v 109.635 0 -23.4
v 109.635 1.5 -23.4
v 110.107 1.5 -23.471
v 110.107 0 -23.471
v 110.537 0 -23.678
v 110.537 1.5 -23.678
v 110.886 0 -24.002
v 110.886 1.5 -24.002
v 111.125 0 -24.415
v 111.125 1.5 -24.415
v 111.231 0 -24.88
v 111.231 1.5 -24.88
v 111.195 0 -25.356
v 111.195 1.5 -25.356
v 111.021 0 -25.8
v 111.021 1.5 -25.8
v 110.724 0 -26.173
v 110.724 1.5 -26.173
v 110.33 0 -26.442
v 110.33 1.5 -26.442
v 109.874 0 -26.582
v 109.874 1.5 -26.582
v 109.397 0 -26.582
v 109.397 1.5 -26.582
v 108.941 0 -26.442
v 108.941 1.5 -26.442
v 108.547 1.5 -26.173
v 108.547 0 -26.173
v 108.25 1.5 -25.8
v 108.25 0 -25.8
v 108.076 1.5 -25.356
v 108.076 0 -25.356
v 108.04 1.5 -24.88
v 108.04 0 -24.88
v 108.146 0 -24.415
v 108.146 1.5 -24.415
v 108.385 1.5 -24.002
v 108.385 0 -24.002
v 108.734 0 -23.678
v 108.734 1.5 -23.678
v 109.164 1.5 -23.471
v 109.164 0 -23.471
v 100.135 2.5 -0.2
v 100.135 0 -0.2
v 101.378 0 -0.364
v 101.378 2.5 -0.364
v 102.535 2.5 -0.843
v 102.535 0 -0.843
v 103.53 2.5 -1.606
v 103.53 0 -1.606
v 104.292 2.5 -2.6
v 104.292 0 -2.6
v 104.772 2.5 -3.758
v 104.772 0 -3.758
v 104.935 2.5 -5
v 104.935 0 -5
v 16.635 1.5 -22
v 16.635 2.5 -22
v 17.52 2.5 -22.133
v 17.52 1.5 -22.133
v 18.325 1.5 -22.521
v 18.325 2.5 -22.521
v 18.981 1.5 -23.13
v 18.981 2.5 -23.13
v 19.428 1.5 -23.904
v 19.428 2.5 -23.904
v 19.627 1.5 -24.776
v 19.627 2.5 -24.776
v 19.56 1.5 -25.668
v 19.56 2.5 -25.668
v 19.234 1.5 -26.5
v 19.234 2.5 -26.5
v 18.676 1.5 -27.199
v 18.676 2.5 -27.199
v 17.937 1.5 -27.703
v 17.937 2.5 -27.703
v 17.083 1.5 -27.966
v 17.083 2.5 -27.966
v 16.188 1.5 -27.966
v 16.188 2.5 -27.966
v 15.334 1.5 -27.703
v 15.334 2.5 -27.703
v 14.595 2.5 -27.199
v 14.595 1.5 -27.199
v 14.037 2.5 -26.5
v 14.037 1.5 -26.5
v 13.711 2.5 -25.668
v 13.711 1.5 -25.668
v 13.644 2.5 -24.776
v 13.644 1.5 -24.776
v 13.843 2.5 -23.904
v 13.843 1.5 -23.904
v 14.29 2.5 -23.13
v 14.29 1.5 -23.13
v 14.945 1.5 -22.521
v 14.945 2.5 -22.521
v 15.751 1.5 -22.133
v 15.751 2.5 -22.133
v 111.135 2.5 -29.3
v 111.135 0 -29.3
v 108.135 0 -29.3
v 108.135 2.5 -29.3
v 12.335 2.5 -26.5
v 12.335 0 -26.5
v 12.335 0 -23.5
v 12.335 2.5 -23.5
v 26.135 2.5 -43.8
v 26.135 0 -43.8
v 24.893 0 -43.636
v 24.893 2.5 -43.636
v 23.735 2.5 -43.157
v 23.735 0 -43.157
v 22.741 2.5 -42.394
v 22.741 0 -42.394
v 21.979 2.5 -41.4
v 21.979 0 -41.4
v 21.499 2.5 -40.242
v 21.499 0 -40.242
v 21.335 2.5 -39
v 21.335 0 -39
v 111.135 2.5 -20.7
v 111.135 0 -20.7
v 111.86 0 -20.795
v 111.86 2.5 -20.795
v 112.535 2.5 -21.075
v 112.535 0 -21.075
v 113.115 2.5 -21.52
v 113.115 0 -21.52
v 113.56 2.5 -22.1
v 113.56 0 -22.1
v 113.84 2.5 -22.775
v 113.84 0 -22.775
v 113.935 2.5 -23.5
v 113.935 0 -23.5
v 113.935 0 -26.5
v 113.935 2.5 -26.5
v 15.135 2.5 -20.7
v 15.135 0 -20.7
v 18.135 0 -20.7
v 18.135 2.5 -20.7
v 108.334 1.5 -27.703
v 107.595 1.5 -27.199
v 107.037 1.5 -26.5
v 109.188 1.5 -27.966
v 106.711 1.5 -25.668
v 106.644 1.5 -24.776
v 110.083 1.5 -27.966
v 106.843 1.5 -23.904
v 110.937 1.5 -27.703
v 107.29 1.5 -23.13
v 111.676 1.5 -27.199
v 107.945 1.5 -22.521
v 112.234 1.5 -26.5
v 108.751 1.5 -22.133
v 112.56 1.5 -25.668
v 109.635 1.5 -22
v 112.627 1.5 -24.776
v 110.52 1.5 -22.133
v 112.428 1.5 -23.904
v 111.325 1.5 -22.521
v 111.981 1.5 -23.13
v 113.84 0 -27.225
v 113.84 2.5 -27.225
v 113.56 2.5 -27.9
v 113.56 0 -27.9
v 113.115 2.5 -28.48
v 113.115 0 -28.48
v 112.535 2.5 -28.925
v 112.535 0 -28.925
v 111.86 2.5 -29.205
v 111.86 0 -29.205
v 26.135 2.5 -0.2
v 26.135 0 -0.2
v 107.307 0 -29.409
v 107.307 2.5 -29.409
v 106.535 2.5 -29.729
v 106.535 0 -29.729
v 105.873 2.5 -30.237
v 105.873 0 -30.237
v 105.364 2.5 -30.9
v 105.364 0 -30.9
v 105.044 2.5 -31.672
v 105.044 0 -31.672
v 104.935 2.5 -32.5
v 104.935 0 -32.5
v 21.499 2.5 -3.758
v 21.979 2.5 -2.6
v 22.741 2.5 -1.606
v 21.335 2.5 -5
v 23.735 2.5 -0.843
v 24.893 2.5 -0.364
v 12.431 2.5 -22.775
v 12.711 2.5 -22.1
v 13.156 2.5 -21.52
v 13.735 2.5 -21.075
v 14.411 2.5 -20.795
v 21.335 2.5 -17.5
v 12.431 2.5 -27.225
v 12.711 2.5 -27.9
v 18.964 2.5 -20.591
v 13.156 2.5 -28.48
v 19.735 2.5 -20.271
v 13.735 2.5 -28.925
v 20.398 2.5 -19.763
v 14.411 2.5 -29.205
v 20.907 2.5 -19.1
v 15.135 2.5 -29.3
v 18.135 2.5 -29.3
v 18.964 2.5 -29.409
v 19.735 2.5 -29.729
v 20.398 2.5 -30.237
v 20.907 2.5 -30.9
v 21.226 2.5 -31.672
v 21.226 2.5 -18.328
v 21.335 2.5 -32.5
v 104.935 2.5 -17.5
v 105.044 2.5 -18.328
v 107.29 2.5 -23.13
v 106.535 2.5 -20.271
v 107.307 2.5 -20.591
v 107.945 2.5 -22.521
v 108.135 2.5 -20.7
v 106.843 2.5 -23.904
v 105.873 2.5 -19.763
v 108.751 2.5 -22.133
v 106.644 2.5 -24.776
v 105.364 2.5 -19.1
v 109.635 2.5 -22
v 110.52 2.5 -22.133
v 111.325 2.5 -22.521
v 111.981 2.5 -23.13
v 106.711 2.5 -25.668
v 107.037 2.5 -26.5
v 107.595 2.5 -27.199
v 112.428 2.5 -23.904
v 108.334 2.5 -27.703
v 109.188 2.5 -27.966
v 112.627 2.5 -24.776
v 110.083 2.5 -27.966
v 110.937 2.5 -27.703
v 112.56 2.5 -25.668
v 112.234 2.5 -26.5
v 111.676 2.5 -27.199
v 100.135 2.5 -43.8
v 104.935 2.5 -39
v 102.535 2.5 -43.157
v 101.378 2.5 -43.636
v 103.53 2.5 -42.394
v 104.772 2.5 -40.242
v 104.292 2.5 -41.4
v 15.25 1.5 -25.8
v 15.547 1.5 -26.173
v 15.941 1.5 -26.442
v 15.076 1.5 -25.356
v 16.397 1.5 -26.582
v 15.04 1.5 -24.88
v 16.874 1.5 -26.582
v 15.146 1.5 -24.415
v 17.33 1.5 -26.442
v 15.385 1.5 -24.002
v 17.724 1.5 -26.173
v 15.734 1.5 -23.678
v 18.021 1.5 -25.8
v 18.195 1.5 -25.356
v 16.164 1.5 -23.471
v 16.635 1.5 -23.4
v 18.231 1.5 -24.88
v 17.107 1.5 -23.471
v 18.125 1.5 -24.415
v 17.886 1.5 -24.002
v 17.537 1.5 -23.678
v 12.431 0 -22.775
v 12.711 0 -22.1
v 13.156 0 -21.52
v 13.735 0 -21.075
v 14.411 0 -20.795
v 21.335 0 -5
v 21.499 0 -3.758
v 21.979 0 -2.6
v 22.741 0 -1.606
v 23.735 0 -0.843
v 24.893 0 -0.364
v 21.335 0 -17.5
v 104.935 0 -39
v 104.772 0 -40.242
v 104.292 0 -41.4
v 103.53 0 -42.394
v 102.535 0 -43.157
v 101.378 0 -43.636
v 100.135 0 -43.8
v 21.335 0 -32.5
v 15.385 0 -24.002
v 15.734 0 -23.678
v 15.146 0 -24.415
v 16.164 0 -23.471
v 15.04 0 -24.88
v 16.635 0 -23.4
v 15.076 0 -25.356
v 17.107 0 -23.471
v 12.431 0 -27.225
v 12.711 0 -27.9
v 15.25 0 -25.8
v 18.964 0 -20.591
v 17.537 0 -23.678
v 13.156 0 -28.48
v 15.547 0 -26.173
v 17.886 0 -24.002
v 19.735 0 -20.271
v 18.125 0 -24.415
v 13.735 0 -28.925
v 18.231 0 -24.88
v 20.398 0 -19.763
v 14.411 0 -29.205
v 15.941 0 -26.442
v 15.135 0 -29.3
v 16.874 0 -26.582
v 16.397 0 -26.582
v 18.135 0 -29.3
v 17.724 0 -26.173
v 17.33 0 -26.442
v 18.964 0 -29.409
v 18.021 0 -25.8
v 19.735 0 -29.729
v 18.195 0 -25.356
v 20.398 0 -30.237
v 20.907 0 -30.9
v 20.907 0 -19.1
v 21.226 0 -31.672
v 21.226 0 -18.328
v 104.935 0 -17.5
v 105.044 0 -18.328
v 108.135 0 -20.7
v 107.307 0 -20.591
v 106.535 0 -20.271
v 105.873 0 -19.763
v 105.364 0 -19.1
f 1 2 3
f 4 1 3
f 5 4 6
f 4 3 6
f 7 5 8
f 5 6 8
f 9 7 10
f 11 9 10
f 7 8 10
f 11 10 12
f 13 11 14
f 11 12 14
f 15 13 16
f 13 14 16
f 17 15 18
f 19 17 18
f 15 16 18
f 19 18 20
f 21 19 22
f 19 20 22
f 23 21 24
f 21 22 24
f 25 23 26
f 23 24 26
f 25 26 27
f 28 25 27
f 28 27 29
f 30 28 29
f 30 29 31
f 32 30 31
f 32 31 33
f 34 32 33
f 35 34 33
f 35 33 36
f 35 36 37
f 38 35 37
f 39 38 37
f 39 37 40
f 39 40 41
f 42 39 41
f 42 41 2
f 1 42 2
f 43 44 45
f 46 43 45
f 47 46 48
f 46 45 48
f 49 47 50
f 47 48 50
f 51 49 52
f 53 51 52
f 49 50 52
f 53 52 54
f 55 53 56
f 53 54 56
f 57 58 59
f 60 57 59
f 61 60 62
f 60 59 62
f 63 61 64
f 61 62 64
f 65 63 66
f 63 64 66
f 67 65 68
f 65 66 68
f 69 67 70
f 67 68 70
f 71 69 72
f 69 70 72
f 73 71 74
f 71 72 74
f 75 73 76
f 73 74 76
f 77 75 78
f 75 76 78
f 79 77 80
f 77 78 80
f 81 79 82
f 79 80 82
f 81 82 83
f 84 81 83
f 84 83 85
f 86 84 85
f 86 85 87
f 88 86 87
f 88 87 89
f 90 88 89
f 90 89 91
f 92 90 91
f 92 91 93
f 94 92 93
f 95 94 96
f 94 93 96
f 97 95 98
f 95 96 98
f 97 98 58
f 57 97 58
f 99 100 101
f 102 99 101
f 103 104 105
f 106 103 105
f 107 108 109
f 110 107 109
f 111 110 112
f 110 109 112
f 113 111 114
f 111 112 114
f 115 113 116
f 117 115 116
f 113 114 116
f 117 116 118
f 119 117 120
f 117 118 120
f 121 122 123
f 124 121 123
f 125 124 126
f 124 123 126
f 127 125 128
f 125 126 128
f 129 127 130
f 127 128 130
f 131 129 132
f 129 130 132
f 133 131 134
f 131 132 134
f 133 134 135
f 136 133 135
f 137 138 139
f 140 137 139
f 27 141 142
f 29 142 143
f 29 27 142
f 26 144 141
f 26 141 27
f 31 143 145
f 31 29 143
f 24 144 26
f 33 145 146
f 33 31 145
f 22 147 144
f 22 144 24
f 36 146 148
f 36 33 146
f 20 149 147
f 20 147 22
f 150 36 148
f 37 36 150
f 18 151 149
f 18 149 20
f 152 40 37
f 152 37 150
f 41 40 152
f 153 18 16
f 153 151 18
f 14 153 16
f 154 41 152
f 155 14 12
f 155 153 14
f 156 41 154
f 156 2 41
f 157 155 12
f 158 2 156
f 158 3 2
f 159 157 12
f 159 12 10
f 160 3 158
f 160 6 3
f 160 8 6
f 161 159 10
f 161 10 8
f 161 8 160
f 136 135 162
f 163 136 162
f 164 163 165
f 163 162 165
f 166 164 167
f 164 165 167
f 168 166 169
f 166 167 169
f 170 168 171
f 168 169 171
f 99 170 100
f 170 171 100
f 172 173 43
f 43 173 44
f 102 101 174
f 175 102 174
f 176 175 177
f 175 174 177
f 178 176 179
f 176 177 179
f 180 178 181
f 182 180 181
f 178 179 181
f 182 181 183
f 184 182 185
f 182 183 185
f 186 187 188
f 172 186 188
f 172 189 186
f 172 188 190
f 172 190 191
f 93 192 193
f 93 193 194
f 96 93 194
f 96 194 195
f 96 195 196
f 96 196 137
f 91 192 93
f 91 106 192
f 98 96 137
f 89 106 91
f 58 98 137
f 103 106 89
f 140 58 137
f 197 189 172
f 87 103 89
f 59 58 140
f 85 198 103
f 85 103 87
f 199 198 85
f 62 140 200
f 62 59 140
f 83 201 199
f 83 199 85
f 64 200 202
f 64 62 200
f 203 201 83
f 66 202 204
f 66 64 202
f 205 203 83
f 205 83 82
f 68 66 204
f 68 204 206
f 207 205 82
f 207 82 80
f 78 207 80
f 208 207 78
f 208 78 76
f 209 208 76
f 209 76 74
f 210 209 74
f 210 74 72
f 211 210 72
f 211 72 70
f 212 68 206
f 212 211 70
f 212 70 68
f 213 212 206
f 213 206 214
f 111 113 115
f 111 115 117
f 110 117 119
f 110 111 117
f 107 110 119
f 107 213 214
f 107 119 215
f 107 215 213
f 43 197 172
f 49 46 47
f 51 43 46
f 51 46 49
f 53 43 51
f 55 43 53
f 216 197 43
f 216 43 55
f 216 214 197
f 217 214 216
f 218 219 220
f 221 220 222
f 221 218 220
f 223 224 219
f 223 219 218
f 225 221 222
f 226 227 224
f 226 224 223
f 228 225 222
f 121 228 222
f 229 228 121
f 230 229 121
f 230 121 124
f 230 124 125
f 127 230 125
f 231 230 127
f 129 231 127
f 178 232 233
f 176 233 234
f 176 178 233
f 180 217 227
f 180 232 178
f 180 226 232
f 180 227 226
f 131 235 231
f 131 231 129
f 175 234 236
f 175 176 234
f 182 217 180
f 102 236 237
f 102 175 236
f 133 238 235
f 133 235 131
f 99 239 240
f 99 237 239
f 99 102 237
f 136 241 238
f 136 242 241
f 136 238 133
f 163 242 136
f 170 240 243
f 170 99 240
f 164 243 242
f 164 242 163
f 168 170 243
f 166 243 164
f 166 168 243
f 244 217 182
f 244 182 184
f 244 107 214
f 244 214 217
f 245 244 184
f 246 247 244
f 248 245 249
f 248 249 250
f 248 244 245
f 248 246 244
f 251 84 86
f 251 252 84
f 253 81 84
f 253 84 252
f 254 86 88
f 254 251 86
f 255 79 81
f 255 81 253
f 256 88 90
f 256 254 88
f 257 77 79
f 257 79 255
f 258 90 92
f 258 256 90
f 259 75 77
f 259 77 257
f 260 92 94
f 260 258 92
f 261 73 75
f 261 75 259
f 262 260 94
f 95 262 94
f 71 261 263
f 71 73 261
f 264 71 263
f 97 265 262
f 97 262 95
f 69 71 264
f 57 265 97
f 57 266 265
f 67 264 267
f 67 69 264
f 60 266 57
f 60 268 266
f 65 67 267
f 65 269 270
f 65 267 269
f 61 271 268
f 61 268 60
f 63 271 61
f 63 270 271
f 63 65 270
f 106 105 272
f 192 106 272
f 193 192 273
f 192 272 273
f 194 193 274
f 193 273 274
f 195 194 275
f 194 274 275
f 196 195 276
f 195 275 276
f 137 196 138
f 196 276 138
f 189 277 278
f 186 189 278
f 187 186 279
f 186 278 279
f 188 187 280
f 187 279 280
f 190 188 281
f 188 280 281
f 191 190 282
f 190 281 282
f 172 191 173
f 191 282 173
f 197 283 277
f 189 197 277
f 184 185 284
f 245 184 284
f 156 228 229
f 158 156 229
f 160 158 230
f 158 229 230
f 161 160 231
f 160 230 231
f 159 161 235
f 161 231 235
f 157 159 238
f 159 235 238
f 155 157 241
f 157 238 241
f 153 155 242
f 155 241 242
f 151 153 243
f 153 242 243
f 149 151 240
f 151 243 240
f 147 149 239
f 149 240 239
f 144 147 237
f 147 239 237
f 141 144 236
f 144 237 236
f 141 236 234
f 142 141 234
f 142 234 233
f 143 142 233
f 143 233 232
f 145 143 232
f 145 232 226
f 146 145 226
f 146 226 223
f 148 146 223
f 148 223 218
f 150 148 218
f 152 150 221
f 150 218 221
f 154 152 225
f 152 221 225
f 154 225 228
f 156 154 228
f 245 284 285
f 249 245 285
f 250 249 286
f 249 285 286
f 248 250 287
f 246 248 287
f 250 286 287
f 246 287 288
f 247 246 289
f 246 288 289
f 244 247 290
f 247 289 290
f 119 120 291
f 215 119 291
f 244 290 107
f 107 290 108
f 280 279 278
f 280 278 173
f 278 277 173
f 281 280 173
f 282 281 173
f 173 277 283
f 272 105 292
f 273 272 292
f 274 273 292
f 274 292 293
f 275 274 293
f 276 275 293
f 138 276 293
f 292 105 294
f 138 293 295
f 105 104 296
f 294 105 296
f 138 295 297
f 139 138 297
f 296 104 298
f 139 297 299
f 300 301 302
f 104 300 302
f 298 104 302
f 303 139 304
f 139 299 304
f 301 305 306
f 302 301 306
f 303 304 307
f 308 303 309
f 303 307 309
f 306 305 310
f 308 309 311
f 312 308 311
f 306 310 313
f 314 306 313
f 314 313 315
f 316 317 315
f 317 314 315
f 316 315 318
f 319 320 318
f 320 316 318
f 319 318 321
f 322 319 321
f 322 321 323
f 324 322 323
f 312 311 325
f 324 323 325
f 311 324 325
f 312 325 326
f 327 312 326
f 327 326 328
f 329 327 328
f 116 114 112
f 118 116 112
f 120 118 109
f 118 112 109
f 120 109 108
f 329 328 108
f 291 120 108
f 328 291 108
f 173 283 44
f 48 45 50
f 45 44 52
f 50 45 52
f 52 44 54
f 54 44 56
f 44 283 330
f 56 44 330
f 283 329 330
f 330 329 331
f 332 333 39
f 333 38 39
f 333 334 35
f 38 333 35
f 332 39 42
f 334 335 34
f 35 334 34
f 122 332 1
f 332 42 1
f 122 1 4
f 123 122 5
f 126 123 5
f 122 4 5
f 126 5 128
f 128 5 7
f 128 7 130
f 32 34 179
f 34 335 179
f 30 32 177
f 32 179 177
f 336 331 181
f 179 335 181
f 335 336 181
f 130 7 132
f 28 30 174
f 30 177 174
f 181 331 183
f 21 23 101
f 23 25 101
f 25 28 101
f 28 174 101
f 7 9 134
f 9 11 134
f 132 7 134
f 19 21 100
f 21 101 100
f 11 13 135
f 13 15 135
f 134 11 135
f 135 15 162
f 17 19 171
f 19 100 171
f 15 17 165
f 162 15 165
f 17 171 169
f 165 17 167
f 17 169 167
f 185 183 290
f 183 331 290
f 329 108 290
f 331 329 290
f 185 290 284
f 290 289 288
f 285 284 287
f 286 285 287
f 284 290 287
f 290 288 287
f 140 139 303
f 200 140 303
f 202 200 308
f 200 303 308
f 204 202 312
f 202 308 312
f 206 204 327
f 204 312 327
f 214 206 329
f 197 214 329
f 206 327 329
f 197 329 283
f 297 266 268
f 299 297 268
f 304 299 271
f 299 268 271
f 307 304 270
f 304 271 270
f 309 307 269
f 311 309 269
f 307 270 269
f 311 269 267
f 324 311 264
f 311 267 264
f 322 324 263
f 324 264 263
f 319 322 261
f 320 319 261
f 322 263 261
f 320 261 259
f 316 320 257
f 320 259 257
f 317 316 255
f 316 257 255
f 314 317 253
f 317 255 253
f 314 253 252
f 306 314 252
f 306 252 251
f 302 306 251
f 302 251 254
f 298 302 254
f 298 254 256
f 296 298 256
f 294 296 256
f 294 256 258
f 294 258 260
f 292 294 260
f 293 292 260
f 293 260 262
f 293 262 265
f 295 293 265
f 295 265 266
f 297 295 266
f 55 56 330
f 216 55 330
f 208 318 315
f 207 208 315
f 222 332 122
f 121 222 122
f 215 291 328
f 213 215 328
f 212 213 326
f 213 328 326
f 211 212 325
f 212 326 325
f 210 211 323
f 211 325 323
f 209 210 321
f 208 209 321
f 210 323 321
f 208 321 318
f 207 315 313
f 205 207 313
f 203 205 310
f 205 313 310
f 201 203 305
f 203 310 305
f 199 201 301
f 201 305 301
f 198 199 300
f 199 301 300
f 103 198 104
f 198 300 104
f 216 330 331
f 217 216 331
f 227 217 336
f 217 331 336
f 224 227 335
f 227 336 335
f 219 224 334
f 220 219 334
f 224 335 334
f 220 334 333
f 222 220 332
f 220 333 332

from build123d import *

# Parameters (mm, degrees)
EXTRUDE_1_DEPTH     = 2.5
SKETCH_2_R          = 1.6
CUT_EXTRUDE_1_DEPTH = 123.090022194
SKETCH_3_R          = 3
CUT_EXTRUDE_2_DEPTH = 1


with BuildPart() as part:
    # 草图1 → 凸台-拉伸1 (new body)
    with BuildSketch(Plane(origin=(0, 0, 0), x_dir=(1, 0, 0), z_dir=(0, 1, 0))):
        with BuildLine():
            Line((26.135435749, 0.2), (100.135435749, 0.2))
            ThreePointArc((100.135435749, 0.2), (103.529548299, 1.60588745), (104.935435749, 5))
            Line((104.935435749, 5), (104.935435749, 17.5))
            ThreePointArc((104.935435749, 17.5), (105.87269405, 19.7627417), (108.135435749, 20.7))
            Line((108.135435749, 20.7), (111.135435749, 20.7))
            ThreePointArc((111.135435749, 20.7), (113.115334737, 21.520101013), (113.935435749, 23.5))
            Line((113.935435749, 23.5), (113.935435749, 26.5))
            ThreePointArc((113.935435749, 26.5), (113.115334737, 28.479898987), (111.135435749, 29.3))
            Line((111.135435749, 29.3), (108.135435749, 29.3))
            ThreePointArc((108.135435749, 29.3), (105.87269405, 30.2372583), (104.935435749, 32.5))
            Line((104.935435749, 32.5), (104.935435749, 39))
            ThreePointArc((104.935435749, 39), (103.529548299, 42.39411255), (100.135435749, 43.8))
            Line((100.135435749, 43.8), (26.135435749, 43.8))
            ThreePointArc((26.135435749, 43.8), (22.7413232, 42.39411255), (21.335435749, 39))
            Line((21.335435749, 39), (21.335435749, 32.5))
            ThreePointArc((21.335435749, 32.5), (20.398177449, 30.2372583), (18.135435749, 29.3))
            Line((18.135435749, 29.3), (15.135435749, 29.3))
            ThreePointArc((15.135435749, 29.3), (13.155536762, 28.479898987), (12.335435749, 26.5))
            Line((12.335435749, 26.5), (12.335435749, 23.5))
            ThreePointArc((12.335435749, 23.5), (13.155536762, 21.520101013), (15.135435749, 20.7))
            Line((15.135435749, 20.7), (18.135435749, 20.7))
            ThreePointArc((18.135435749, 20.7), (20.398177449, 19.7627417), (21.335435749, 17.5))
            Line((21.335435749, 17.5), (21.335435749, 5))
            ThreePointArc((21.335435749, 5), (22.7413232, 1.60588745), (26.135435749, 0.2))
        make_face()
    extrude(amount=EXTRUDE_1_DEPTH)

    # 草图2 → 切除-拉伸1 (cut, through all)
    with BuildSketch(Plane(origin=(0, 2.5, 0), x_dir=(1, 0, 0), z_dir=(0, 1, 0))):
        with Locations(Location((16.635435749, 25, 0), (0, 0, 270))):
            Circle(SKETCH_2_R)
        with Locations(Location((109.635435749, 25, 0), (0, 0, 270))):
            Circle(SKETCH_2_R)
    extrude(amount=-CUT_EXTRUDE_1_DEPTH, mode=Mode.SUBTRACT)

    # 草图3 → 切除-拉伸2 (cut)
    with BuildSketch(Plane(origin=(0, 2.5, 0), x_dir=(1, 0, 0), z_dir=(0, 1, 0))):
        with Locations(Location((16.635435749, 25, 0), (0, 0, 270))):
            Circle(SKETCH_3_R)
        with Locations(Location((109.635435749, 25, 0), (0, 0, 270))):
            Circle(SKETCH_3_R)
    extrude(amount=-CUT_EXTRUDE_2_DEPTH, mode=Mode.SUBTRACT)


solid = part.part
